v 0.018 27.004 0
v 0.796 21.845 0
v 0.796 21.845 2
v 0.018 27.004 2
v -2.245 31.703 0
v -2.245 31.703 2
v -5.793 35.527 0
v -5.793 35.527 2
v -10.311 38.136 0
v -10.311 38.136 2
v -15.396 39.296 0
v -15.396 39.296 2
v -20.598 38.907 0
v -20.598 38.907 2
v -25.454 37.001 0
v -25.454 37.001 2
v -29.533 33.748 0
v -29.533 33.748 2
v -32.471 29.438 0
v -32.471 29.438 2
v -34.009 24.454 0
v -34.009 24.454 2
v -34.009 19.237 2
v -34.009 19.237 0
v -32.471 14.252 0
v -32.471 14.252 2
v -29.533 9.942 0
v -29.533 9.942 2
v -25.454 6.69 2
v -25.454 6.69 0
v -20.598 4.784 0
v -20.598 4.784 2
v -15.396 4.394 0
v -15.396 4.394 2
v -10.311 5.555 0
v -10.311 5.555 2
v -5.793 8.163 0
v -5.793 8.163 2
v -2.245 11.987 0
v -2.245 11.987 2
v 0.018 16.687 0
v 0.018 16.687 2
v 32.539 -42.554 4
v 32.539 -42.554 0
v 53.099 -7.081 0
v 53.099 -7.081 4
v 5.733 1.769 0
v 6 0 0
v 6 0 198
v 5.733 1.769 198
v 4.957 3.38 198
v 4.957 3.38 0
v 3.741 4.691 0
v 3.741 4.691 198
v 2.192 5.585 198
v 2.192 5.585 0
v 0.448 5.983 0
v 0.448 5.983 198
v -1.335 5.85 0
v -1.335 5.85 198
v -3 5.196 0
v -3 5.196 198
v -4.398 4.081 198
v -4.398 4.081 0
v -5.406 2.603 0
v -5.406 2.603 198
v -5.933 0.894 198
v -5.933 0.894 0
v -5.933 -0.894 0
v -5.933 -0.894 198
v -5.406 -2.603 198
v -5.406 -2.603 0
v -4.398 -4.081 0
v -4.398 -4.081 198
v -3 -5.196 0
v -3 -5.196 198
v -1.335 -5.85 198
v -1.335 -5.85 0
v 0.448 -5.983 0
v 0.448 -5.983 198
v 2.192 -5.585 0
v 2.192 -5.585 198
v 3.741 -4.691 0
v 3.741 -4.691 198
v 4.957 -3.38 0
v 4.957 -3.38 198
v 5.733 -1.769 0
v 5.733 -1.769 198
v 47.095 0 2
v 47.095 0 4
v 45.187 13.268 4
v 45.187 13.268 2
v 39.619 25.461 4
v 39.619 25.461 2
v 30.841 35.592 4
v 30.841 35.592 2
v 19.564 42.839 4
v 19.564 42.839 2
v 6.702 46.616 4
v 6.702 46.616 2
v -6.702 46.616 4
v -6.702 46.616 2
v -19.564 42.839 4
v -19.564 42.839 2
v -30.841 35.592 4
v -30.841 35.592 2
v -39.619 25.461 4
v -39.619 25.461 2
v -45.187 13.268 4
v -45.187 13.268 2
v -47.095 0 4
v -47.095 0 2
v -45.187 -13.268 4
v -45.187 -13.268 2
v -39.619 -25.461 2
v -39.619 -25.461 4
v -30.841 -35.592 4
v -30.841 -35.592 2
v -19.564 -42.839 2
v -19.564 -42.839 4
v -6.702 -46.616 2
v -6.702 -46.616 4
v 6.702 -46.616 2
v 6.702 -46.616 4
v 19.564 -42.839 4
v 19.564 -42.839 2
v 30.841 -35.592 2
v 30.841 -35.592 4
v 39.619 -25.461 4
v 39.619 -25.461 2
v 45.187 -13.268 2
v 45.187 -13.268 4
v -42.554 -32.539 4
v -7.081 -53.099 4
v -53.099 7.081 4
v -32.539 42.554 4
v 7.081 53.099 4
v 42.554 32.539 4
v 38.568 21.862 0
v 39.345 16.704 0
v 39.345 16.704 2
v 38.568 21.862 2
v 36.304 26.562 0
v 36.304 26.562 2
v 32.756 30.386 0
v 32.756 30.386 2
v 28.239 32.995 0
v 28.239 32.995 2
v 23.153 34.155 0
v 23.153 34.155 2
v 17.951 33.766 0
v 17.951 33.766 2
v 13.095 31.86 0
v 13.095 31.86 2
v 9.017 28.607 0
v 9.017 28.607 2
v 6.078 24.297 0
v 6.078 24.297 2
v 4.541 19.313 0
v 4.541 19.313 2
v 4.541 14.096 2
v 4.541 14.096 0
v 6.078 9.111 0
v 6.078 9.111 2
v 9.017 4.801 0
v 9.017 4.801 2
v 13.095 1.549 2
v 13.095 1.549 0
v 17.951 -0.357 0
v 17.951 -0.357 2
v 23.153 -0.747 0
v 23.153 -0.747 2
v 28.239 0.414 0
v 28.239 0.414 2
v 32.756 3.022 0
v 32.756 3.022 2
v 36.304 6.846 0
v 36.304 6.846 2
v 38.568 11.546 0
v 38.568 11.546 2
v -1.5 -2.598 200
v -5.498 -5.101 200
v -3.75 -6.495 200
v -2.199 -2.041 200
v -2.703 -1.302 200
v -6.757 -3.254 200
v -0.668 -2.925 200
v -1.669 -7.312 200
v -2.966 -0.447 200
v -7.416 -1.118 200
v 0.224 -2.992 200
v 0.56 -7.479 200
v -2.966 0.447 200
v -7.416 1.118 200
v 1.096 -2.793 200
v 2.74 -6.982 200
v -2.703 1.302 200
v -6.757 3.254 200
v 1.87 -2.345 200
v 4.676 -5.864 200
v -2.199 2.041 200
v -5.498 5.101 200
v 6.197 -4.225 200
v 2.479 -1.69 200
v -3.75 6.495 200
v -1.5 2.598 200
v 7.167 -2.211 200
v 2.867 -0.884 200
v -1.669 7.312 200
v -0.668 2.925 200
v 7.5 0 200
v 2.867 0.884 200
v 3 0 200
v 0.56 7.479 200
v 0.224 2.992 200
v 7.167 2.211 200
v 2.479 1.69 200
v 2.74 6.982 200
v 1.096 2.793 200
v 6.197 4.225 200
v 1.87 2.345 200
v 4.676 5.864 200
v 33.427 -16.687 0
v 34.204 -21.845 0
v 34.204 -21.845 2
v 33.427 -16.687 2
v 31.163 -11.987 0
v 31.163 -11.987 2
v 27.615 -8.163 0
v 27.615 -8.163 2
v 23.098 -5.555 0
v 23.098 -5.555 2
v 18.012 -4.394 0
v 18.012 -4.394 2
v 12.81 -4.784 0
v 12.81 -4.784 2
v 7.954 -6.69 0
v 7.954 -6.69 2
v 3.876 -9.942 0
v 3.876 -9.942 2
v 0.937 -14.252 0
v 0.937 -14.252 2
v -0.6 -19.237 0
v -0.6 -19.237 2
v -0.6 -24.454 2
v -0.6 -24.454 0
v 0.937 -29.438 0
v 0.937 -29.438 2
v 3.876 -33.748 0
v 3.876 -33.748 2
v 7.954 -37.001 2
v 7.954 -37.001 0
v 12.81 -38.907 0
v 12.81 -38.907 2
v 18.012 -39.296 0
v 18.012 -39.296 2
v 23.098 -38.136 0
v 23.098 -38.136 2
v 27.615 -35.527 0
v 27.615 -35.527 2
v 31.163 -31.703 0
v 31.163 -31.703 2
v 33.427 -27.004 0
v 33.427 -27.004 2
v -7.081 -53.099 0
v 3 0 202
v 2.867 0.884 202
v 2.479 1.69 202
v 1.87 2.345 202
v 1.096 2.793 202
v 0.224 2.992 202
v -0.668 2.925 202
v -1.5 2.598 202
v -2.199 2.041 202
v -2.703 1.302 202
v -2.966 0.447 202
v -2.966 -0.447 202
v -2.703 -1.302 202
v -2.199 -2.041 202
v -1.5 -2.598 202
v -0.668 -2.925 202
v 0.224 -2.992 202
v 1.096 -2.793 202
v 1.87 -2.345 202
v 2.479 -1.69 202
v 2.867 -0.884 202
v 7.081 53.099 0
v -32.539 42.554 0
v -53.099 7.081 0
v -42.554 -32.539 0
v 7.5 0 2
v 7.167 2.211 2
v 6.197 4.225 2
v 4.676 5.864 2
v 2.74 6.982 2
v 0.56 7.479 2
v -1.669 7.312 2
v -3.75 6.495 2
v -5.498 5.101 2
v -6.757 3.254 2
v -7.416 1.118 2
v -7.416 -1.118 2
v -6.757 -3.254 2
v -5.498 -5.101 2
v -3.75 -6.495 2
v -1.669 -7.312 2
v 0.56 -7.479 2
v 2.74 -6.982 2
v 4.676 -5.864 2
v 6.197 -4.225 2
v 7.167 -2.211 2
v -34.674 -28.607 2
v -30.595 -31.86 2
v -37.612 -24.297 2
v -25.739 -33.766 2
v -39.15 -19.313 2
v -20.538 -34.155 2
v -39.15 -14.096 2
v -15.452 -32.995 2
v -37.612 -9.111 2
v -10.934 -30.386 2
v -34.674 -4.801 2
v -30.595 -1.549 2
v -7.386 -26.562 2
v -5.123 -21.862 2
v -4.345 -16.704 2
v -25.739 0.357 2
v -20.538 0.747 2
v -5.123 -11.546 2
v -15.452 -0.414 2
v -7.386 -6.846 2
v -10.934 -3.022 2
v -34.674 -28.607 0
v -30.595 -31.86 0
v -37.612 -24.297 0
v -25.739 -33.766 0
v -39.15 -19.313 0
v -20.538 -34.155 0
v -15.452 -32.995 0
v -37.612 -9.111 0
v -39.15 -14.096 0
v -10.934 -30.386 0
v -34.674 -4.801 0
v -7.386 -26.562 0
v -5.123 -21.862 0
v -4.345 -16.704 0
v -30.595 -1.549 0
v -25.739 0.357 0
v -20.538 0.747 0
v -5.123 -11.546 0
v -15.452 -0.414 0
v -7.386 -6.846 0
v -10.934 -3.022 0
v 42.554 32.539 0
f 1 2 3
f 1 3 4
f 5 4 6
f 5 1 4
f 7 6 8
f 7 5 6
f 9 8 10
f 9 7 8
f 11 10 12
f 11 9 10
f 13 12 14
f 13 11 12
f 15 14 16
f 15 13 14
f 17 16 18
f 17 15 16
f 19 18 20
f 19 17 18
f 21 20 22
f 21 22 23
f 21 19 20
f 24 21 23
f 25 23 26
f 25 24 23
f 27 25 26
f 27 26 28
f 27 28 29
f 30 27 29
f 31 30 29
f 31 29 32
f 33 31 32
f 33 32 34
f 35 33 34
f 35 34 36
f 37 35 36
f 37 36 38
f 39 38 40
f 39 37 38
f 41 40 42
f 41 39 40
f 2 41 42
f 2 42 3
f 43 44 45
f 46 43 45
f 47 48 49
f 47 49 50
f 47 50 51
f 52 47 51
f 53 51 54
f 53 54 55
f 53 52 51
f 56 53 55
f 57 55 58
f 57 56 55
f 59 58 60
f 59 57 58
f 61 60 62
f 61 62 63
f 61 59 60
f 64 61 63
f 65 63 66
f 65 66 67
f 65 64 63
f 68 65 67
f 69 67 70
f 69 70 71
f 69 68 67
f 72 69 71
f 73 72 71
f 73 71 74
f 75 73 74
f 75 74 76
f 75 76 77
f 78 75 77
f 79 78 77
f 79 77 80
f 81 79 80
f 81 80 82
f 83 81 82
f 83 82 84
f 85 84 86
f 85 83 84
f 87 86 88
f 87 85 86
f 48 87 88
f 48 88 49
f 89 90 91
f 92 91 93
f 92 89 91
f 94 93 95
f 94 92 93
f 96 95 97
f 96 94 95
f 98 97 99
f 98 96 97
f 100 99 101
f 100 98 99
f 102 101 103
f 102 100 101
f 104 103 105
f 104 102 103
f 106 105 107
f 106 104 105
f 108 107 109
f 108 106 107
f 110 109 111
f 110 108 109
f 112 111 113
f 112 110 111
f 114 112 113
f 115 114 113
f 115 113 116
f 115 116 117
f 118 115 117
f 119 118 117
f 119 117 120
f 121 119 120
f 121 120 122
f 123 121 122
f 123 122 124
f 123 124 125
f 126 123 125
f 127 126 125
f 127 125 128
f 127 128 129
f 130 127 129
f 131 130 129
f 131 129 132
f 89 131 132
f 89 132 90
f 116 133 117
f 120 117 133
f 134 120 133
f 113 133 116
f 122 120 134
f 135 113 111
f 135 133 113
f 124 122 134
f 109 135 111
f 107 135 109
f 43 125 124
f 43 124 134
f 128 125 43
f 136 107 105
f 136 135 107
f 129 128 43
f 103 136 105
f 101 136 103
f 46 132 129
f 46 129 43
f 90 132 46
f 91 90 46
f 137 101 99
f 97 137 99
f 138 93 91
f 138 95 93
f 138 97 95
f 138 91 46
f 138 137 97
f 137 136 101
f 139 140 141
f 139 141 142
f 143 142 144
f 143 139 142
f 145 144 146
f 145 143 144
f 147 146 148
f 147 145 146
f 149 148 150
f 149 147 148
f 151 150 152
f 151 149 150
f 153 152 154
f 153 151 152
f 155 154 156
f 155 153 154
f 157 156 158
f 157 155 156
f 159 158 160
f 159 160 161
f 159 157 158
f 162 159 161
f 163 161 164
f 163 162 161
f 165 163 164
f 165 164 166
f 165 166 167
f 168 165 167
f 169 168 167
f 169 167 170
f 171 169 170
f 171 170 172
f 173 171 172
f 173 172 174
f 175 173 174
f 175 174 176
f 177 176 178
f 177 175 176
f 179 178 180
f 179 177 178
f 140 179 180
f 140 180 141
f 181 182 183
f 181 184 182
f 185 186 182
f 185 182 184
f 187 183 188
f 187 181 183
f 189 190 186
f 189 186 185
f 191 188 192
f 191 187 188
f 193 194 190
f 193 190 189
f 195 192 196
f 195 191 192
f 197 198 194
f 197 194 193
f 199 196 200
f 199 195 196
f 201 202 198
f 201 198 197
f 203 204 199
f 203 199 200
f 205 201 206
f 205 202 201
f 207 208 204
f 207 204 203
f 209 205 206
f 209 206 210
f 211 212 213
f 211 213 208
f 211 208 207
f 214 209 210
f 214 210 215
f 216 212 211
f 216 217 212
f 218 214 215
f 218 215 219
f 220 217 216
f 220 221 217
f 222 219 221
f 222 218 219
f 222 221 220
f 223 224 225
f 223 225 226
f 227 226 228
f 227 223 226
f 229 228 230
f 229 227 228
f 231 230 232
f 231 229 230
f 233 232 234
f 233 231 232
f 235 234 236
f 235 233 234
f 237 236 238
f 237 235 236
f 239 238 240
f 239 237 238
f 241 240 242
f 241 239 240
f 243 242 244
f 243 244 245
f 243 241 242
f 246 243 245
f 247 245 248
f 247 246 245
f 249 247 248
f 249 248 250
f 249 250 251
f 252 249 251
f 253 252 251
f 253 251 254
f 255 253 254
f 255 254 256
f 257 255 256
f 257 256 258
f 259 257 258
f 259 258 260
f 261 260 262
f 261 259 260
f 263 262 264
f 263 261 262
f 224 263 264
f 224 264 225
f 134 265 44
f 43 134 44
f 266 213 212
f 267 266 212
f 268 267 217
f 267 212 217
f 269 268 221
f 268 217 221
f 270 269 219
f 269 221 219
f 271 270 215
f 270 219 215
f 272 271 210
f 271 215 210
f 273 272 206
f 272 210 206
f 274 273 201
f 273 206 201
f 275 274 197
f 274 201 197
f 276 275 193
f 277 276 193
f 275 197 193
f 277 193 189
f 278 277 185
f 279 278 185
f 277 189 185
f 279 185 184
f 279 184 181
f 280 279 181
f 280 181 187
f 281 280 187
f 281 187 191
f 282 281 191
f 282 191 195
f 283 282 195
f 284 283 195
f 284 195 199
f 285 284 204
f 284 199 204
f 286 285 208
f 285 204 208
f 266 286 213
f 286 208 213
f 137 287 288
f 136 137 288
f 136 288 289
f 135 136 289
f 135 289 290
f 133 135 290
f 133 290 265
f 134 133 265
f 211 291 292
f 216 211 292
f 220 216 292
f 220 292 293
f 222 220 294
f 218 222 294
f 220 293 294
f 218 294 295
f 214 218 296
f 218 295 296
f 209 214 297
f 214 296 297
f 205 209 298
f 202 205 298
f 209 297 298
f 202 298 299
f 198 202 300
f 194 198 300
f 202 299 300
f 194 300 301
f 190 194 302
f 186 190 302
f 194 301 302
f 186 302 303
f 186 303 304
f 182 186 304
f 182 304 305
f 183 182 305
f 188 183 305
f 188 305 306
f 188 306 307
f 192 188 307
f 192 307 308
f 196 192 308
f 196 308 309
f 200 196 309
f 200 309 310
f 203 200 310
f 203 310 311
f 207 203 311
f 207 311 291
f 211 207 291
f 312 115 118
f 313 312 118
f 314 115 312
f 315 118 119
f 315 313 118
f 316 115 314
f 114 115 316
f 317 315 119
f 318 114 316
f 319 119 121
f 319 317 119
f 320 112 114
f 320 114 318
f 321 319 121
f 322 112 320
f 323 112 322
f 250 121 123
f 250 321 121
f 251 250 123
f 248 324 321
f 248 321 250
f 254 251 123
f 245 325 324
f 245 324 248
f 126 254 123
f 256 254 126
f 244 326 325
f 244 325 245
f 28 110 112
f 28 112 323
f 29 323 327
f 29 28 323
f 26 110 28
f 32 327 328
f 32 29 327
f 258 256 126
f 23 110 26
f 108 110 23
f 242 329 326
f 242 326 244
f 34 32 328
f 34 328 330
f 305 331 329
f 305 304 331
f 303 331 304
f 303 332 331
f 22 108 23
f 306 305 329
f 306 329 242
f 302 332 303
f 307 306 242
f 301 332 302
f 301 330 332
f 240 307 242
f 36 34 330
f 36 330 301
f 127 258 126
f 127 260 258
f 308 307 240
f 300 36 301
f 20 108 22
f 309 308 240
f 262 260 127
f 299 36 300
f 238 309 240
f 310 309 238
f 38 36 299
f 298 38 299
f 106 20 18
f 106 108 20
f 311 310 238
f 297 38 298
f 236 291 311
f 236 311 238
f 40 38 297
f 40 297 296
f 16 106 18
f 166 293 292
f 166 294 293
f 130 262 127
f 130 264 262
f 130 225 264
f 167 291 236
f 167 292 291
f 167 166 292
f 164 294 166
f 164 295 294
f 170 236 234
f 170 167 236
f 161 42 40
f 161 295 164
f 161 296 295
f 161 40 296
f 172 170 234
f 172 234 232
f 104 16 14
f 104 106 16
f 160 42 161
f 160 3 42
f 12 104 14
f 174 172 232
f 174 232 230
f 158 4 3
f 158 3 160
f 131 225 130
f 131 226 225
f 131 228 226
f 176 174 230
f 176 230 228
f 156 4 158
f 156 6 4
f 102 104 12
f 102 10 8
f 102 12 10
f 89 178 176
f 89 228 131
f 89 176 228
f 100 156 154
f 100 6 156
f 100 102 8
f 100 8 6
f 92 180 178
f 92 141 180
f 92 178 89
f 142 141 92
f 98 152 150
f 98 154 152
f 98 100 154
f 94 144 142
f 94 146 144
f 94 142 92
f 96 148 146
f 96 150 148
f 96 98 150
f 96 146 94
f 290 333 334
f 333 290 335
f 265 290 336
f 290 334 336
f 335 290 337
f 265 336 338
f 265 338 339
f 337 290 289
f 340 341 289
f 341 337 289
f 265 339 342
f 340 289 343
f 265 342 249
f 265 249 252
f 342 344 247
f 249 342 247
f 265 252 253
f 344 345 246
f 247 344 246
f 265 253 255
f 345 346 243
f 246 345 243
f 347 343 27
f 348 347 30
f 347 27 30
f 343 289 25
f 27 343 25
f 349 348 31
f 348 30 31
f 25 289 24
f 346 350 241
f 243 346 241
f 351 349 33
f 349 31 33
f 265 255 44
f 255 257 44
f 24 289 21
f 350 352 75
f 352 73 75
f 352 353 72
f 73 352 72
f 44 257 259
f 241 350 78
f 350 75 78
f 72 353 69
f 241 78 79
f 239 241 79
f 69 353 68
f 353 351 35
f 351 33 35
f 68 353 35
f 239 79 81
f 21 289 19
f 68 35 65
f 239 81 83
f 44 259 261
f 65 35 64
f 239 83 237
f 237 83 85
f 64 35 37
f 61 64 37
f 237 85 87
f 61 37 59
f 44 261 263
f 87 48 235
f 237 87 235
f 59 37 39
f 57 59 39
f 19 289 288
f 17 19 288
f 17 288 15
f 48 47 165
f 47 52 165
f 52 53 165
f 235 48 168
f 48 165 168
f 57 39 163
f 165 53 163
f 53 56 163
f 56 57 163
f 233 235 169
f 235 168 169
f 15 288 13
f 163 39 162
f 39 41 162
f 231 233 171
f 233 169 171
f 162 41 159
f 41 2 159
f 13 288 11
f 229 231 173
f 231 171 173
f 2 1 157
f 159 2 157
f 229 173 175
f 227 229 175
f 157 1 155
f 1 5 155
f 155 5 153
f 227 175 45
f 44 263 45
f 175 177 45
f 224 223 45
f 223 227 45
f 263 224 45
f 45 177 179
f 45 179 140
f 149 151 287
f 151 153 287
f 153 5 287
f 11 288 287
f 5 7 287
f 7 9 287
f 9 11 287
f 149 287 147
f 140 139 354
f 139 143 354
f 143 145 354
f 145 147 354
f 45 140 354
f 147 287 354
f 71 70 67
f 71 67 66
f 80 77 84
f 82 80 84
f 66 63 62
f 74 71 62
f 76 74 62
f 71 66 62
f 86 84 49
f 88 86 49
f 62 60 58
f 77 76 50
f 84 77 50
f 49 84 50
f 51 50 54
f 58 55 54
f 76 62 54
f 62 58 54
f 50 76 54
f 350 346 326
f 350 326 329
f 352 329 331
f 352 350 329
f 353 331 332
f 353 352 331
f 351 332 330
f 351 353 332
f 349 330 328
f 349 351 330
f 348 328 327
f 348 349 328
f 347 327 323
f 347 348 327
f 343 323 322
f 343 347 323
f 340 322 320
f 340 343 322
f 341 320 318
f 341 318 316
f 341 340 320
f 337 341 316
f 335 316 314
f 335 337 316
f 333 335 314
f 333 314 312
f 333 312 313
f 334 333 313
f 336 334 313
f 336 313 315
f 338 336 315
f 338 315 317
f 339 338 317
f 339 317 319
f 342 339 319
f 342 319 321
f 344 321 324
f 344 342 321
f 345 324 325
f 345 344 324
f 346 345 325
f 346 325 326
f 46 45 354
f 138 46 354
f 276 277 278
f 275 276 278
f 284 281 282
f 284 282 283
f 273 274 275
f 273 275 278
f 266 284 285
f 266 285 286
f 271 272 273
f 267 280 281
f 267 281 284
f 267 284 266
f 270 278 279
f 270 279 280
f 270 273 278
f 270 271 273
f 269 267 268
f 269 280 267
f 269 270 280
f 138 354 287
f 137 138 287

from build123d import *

# Parameters (mm, degrees)
F0_R     = 7.5
F0_R_2   = 6
F1_DEPTH = 200
F2_DEPTH = 198
F0_R_3   = 47.095
F0_R_4   = 17.5
F3_DEPTH = 2
F4_DEPTH = 4
F6_R     = 3
F7_DEPTH = 2


with BuildPart() as f1:
    # F0 (on Top) → F1 (new body)
    with BuildSketch(Plane.XY):
        Circle(F0_R)
        Circle(F0_R_2, mode=Mode.SUBTRACT)
        Circle(F0_R_2)
    extrude(amount=F1_DEPTH)

    # F0 (on Top) → F2 (cut)
    with BuildSketch(Plane.XY):
        Circle(F0_R_2)
    extrude(amount=F2_DEPTH, mode=Mode.SUBTRACT)

    # F0 (on Top) → F3 (join)
    with BuildSketch(Plane.XY):
        Polygon((-32.5393686004, 42.5539186241), (-53.098972618, 7.0813562323), (-42.5539186241, -32.5393686004), (-7.0813562323, -53.098972618), (32.5393686004, -42.5539186241), (53.098972618, -7.0813562323), (42.5539186241, 32.5393686004), (7.0813562323, 53.098972618), align=None)
        Circle(F0_R_3, mode=Mode.SUBTRACT)
        Circle(F0_R_3)
        with Locations((-21.8453019556, -16.7042743772)):
            Circle(F0_R_4, mode=Mode.SUBTRACT)
        with Locations((16.7042743772, -21.8453019556)):
            Circle(F0_R_4, mode=Mode.SUBTRACT)
        with Locations((-16.7042743772, 21.8453019556)):
            Circle(F0_R_4, mode=Mode.SUBTRACT)
        Circle(F0_R, mode=Mode.SUBTRACT)
        with Locations((21.8453019556, 16.7042743772)):
            Circle(F0_R_4, mode=Mode.SUBTRACT)
    extrude(amount=F3_DEPTH)

    # F0 (on Top) → F4 (join)
    with BuildSketch(Plane.XY):
        Polygon((-32.5393686004, 42.5539186241), (-53.098972618, 7.0813562323), (-42.5539186241, -32.5393686004), (-7.0813562323, -53.098972618), (32.5393686004, -42.5539186241), (53.098972618, -7.0813562323), (42.5539186241, 32.5393686004), (7.0813562323, 53.098972618), align=None)
        Circle(F0_R_3, mode=Mode.SUBTRACT)
    extrude(amount=F4_DEPTH)

    # F6 (on offset) → F7 (join)
    with BuildSketch(Plane.XY.offset(200)):
        Circle(F6_R)
    extrude(amount=F7_DEPTH)


solid = f1.part
